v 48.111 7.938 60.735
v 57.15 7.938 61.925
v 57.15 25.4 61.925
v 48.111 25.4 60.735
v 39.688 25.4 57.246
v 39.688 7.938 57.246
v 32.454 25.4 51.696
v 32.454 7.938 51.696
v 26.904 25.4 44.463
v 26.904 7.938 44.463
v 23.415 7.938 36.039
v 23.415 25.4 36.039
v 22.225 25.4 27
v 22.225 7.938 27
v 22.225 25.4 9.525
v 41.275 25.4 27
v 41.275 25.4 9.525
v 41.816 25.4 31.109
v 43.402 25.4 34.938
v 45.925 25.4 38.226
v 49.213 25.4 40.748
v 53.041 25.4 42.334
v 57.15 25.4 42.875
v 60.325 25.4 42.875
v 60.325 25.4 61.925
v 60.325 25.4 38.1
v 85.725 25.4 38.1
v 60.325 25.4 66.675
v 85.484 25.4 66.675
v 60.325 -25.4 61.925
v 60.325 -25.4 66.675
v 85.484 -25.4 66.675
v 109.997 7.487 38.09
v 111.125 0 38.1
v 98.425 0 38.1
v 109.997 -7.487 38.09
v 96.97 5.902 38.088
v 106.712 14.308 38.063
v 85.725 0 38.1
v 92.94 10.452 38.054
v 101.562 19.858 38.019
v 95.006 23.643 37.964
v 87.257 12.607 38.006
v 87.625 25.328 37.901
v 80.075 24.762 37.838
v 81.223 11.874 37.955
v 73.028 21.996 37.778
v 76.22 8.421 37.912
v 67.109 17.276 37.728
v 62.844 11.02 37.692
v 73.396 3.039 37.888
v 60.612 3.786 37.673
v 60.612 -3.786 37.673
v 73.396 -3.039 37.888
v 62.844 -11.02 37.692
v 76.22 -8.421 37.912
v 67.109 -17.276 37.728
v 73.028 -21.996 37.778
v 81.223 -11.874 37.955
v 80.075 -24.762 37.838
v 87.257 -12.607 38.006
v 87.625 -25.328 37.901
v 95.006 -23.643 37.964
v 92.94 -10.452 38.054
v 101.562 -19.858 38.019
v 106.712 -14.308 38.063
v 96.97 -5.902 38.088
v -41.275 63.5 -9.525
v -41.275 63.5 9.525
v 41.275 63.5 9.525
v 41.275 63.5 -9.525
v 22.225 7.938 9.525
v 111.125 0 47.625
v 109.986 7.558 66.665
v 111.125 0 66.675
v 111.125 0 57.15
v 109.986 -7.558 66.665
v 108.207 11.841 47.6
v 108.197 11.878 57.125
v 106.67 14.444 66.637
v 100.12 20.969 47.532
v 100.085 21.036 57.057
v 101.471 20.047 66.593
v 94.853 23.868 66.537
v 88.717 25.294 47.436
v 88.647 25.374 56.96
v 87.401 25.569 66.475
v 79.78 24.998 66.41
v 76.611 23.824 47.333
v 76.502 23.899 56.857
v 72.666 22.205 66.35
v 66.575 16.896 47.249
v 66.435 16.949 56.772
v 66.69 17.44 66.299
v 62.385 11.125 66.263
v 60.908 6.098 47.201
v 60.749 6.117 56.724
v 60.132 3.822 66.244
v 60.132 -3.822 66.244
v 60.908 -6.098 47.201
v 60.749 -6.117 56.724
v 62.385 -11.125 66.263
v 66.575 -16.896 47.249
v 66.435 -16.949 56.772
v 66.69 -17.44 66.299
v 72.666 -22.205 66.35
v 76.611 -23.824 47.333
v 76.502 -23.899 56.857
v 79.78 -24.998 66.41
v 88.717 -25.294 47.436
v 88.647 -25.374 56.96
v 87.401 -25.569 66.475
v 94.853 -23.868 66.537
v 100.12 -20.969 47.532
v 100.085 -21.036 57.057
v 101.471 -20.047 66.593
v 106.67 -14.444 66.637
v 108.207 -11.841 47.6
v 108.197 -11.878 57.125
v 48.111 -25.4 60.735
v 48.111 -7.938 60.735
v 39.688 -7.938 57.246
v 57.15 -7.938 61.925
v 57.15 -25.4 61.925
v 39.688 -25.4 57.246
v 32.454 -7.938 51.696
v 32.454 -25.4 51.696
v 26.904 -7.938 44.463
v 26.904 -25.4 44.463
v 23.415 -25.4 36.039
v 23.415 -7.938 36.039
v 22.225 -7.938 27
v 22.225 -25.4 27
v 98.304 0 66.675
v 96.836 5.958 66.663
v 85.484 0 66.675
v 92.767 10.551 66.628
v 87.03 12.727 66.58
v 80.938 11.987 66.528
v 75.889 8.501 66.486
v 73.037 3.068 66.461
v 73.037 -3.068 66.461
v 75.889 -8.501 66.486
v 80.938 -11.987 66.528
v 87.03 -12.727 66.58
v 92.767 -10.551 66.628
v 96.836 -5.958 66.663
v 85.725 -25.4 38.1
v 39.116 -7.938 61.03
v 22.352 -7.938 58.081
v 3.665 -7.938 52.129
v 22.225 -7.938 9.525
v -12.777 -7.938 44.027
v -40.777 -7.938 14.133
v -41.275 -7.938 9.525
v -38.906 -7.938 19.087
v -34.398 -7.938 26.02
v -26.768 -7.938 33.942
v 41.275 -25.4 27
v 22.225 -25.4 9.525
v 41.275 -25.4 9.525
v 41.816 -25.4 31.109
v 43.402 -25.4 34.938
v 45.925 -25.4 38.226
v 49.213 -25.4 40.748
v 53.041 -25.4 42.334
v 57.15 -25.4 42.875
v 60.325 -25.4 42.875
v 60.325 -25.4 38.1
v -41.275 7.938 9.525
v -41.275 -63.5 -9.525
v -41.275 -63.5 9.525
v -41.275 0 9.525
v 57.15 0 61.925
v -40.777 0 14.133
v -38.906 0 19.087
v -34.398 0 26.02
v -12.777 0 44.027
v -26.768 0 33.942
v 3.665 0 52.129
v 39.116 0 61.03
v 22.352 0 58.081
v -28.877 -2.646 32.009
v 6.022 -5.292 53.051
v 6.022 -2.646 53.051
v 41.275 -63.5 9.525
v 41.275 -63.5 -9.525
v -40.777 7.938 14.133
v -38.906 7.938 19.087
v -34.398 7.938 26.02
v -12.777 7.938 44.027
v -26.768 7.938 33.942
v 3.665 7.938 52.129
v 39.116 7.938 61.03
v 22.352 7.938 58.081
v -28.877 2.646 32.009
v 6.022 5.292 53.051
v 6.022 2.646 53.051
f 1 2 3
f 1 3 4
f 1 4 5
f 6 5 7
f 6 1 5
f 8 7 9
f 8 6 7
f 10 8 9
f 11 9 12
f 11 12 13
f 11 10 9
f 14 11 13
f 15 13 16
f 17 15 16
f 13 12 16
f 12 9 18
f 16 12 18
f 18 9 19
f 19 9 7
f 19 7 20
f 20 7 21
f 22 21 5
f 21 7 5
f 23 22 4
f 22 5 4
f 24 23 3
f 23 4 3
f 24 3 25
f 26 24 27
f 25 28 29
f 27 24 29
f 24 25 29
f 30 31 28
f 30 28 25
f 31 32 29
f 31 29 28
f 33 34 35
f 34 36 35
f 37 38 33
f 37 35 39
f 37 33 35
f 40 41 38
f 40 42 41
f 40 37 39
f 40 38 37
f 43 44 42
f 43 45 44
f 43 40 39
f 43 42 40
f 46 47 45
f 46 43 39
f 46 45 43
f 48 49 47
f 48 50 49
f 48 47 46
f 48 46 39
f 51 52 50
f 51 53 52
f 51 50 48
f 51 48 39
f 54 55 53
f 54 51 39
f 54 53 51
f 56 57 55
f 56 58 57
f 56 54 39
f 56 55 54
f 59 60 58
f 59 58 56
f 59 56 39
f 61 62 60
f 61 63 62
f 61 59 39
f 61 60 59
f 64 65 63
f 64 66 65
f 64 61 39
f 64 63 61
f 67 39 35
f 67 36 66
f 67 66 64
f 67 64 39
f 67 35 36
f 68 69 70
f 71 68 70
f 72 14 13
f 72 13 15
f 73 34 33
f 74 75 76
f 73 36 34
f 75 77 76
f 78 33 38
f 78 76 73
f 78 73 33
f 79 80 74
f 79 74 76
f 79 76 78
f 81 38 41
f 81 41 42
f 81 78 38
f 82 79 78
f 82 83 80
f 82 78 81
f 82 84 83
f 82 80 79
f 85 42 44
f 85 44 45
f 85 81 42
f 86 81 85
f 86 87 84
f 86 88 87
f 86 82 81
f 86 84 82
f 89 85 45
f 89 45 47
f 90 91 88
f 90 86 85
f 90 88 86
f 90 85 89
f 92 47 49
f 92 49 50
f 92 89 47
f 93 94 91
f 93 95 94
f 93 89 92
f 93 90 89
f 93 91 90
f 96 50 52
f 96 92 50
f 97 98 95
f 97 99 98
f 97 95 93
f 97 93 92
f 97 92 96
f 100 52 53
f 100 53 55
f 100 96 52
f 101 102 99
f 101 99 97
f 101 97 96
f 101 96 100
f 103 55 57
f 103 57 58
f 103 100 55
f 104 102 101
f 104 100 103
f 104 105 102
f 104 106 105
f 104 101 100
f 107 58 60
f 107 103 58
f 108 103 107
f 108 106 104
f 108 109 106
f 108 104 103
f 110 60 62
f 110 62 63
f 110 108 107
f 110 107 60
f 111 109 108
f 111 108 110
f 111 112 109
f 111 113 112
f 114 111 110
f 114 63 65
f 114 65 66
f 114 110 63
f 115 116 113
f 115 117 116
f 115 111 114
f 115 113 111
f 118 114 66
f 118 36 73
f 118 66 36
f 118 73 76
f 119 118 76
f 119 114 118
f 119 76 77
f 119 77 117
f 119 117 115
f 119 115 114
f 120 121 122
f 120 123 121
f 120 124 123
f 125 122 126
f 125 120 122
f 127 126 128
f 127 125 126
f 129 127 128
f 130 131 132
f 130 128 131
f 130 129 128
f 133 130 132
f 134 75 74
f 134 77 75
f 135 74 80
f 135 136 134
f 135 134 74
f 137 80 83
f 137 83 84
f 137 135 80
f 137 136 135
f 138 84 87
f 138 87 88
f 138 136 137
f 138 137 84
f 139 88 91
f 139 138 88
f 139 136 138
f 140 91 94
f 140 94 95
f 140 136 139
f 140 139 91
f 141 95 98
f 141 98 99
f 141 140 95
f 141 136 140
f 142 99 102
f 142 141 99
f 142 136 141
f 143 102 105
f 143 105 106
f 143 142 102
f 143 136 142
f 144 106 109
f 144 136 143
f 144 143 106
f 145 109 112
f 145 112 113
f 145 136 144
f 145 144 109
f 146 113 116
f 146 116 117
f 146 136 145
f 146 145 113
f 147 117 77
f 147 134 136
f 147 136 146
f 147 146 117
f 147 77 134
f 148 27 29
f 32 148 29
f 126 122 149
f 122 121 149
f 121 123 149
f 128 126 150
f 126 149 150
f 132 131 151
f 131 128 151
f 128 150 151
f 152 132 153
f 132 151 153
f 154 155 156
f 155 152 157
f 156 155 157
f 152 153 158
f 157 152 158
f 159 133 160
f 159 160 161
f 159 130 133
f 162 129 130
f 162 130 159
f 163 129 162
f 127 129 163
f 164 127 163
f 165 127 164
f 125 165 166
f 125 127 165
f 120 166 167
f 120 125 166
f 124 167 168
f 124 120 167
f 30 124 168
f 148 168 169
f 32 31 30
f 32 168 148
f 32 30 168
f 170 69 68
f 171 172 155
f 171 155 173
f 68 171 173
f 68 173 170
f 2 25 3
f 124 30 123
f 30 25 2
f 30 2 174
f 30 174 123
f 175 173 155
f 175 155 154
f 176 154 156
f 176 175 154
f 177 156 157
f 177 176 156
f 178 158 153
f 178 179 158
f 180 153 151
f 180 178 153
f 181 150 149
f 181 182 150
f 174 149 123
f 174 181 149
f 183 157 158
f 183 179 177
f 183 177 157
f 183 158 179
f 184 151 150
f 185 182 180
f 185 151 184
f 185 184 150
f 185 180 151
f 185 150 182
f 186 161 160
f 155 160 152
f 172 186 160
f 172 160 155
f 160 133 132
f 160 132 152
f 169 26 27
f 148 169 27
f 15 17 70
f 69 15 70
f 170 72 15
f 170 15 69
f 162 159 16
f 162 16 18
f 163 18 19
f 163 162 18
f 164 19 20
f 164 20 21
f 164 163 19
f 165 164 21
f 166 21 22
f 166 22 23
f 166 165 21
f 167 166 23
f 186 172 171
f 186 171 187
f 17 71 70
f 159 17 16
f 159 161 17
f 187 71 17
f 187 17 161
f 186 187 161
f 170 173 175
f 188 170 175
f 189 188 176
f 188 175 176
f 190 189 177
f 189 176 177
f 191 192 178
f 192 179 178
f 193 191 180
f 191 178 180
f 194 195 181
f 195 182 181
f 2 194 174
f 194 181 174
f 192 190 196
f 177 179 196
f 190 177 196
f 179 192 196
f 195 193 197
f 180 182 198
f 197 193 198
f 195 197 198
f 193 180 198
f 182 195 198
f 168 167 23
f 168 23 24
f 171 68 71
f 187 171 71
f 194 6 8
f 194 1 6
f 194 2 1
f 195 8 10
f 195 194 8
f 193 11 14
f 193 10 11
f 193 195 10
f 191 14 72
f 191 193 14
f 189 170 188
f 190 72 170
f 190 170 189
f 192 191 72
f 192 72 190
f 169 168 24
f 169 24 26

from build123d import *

# Parameters (mm, degrees)
F1_DEPTH = 63.5
F2_DEPTH = 25.4
F3_DEPTH = 7.9375


with BuildPart() as f1:
    # F0 (on Front) → F1 (new body, symmetric)
    with BuildSketch(Plane.XZ):
        Polygon((22.225, 9.525), (-41.275, 9.525), (-41.275, -9.525), (41.275, -9.525), (41.275, 9.525), align=None)
    extrude(amount=F1_DEPTH, both=True)

    # F0 (on Front) → F2 (join, symmetric)
    with BuildSketch(Plane.XZ):
        with BuildLine():
            Line((22.225, 27.0002), (22.225, 9.525))
            Line((22.225, 9.525), (41.275, 9.525))
            Line((41.275, 9.525), (41.275, 27.0002))
            ThreePointArc((41.275, 27.0002), (45.9246798487, 38.2255201513), (57.15, 42.8752))
            Line((57.15, 42.8752), (60.325, 42.8752))
            Line((60.325, 42.8752), (60.325, 61.9252))
            Line((60.325, 61.9252), (57.15, 61.9252))
            ThreePointArc((57.15, 61.9252), (32.4542956671, 51.6959043329), (22.225, 27.0002))
        make_face()
        Polygon((60.325, 66.675), (60.325, 61.9252), (60.325, 42.8752), (60.325, 38.1), (85.725, 38.1), (85.4835137725, 66.675), align=None)
    extrude(amount=F2_DEPTH, both=True)

    # F0 (on Front) → F3 (join, symmetric)
    with BuildSketch(Plane.XZ):
        with BuildLine():
            add(Edge.make_bspline(
                [(-41.275, 9.525), (-42.2199703753, 29.1535835713), (0, 62.711648643), (57.15, 61.9252)],
                knots=[0, 0, 0, 0, 111.5045361635, 111.5045361635, 111.5045361635, 111.5045361635], degree=3))
            Line((-41.275, 9.525), (22.225, 9.525))
            Line((22.225, 9.525), (22.225, 27.0002))
            ThreePointArc((22.225, 27.0002), (32.4542956671, 51.6959043329), (57.15, 61.9252))
        make_face()
    extrude(amount=F3_DEPTH, both=True)


with BuildPart() as f4:
    # F0 (on Front) → F4 (revolve)
    with BuildSketch(Plane.XZ):
        Polygon((111.125, 66.675), (85.4835137725, 66.675), (85.725, 38.1), (111.125, 38.1), align=None)
    revolve(axis=Axis((85.6042568862, 0, 52.3875), (-0.0084506598, 0, 0.9999642925)))


solid = Compound([f1.part, f4.part])
